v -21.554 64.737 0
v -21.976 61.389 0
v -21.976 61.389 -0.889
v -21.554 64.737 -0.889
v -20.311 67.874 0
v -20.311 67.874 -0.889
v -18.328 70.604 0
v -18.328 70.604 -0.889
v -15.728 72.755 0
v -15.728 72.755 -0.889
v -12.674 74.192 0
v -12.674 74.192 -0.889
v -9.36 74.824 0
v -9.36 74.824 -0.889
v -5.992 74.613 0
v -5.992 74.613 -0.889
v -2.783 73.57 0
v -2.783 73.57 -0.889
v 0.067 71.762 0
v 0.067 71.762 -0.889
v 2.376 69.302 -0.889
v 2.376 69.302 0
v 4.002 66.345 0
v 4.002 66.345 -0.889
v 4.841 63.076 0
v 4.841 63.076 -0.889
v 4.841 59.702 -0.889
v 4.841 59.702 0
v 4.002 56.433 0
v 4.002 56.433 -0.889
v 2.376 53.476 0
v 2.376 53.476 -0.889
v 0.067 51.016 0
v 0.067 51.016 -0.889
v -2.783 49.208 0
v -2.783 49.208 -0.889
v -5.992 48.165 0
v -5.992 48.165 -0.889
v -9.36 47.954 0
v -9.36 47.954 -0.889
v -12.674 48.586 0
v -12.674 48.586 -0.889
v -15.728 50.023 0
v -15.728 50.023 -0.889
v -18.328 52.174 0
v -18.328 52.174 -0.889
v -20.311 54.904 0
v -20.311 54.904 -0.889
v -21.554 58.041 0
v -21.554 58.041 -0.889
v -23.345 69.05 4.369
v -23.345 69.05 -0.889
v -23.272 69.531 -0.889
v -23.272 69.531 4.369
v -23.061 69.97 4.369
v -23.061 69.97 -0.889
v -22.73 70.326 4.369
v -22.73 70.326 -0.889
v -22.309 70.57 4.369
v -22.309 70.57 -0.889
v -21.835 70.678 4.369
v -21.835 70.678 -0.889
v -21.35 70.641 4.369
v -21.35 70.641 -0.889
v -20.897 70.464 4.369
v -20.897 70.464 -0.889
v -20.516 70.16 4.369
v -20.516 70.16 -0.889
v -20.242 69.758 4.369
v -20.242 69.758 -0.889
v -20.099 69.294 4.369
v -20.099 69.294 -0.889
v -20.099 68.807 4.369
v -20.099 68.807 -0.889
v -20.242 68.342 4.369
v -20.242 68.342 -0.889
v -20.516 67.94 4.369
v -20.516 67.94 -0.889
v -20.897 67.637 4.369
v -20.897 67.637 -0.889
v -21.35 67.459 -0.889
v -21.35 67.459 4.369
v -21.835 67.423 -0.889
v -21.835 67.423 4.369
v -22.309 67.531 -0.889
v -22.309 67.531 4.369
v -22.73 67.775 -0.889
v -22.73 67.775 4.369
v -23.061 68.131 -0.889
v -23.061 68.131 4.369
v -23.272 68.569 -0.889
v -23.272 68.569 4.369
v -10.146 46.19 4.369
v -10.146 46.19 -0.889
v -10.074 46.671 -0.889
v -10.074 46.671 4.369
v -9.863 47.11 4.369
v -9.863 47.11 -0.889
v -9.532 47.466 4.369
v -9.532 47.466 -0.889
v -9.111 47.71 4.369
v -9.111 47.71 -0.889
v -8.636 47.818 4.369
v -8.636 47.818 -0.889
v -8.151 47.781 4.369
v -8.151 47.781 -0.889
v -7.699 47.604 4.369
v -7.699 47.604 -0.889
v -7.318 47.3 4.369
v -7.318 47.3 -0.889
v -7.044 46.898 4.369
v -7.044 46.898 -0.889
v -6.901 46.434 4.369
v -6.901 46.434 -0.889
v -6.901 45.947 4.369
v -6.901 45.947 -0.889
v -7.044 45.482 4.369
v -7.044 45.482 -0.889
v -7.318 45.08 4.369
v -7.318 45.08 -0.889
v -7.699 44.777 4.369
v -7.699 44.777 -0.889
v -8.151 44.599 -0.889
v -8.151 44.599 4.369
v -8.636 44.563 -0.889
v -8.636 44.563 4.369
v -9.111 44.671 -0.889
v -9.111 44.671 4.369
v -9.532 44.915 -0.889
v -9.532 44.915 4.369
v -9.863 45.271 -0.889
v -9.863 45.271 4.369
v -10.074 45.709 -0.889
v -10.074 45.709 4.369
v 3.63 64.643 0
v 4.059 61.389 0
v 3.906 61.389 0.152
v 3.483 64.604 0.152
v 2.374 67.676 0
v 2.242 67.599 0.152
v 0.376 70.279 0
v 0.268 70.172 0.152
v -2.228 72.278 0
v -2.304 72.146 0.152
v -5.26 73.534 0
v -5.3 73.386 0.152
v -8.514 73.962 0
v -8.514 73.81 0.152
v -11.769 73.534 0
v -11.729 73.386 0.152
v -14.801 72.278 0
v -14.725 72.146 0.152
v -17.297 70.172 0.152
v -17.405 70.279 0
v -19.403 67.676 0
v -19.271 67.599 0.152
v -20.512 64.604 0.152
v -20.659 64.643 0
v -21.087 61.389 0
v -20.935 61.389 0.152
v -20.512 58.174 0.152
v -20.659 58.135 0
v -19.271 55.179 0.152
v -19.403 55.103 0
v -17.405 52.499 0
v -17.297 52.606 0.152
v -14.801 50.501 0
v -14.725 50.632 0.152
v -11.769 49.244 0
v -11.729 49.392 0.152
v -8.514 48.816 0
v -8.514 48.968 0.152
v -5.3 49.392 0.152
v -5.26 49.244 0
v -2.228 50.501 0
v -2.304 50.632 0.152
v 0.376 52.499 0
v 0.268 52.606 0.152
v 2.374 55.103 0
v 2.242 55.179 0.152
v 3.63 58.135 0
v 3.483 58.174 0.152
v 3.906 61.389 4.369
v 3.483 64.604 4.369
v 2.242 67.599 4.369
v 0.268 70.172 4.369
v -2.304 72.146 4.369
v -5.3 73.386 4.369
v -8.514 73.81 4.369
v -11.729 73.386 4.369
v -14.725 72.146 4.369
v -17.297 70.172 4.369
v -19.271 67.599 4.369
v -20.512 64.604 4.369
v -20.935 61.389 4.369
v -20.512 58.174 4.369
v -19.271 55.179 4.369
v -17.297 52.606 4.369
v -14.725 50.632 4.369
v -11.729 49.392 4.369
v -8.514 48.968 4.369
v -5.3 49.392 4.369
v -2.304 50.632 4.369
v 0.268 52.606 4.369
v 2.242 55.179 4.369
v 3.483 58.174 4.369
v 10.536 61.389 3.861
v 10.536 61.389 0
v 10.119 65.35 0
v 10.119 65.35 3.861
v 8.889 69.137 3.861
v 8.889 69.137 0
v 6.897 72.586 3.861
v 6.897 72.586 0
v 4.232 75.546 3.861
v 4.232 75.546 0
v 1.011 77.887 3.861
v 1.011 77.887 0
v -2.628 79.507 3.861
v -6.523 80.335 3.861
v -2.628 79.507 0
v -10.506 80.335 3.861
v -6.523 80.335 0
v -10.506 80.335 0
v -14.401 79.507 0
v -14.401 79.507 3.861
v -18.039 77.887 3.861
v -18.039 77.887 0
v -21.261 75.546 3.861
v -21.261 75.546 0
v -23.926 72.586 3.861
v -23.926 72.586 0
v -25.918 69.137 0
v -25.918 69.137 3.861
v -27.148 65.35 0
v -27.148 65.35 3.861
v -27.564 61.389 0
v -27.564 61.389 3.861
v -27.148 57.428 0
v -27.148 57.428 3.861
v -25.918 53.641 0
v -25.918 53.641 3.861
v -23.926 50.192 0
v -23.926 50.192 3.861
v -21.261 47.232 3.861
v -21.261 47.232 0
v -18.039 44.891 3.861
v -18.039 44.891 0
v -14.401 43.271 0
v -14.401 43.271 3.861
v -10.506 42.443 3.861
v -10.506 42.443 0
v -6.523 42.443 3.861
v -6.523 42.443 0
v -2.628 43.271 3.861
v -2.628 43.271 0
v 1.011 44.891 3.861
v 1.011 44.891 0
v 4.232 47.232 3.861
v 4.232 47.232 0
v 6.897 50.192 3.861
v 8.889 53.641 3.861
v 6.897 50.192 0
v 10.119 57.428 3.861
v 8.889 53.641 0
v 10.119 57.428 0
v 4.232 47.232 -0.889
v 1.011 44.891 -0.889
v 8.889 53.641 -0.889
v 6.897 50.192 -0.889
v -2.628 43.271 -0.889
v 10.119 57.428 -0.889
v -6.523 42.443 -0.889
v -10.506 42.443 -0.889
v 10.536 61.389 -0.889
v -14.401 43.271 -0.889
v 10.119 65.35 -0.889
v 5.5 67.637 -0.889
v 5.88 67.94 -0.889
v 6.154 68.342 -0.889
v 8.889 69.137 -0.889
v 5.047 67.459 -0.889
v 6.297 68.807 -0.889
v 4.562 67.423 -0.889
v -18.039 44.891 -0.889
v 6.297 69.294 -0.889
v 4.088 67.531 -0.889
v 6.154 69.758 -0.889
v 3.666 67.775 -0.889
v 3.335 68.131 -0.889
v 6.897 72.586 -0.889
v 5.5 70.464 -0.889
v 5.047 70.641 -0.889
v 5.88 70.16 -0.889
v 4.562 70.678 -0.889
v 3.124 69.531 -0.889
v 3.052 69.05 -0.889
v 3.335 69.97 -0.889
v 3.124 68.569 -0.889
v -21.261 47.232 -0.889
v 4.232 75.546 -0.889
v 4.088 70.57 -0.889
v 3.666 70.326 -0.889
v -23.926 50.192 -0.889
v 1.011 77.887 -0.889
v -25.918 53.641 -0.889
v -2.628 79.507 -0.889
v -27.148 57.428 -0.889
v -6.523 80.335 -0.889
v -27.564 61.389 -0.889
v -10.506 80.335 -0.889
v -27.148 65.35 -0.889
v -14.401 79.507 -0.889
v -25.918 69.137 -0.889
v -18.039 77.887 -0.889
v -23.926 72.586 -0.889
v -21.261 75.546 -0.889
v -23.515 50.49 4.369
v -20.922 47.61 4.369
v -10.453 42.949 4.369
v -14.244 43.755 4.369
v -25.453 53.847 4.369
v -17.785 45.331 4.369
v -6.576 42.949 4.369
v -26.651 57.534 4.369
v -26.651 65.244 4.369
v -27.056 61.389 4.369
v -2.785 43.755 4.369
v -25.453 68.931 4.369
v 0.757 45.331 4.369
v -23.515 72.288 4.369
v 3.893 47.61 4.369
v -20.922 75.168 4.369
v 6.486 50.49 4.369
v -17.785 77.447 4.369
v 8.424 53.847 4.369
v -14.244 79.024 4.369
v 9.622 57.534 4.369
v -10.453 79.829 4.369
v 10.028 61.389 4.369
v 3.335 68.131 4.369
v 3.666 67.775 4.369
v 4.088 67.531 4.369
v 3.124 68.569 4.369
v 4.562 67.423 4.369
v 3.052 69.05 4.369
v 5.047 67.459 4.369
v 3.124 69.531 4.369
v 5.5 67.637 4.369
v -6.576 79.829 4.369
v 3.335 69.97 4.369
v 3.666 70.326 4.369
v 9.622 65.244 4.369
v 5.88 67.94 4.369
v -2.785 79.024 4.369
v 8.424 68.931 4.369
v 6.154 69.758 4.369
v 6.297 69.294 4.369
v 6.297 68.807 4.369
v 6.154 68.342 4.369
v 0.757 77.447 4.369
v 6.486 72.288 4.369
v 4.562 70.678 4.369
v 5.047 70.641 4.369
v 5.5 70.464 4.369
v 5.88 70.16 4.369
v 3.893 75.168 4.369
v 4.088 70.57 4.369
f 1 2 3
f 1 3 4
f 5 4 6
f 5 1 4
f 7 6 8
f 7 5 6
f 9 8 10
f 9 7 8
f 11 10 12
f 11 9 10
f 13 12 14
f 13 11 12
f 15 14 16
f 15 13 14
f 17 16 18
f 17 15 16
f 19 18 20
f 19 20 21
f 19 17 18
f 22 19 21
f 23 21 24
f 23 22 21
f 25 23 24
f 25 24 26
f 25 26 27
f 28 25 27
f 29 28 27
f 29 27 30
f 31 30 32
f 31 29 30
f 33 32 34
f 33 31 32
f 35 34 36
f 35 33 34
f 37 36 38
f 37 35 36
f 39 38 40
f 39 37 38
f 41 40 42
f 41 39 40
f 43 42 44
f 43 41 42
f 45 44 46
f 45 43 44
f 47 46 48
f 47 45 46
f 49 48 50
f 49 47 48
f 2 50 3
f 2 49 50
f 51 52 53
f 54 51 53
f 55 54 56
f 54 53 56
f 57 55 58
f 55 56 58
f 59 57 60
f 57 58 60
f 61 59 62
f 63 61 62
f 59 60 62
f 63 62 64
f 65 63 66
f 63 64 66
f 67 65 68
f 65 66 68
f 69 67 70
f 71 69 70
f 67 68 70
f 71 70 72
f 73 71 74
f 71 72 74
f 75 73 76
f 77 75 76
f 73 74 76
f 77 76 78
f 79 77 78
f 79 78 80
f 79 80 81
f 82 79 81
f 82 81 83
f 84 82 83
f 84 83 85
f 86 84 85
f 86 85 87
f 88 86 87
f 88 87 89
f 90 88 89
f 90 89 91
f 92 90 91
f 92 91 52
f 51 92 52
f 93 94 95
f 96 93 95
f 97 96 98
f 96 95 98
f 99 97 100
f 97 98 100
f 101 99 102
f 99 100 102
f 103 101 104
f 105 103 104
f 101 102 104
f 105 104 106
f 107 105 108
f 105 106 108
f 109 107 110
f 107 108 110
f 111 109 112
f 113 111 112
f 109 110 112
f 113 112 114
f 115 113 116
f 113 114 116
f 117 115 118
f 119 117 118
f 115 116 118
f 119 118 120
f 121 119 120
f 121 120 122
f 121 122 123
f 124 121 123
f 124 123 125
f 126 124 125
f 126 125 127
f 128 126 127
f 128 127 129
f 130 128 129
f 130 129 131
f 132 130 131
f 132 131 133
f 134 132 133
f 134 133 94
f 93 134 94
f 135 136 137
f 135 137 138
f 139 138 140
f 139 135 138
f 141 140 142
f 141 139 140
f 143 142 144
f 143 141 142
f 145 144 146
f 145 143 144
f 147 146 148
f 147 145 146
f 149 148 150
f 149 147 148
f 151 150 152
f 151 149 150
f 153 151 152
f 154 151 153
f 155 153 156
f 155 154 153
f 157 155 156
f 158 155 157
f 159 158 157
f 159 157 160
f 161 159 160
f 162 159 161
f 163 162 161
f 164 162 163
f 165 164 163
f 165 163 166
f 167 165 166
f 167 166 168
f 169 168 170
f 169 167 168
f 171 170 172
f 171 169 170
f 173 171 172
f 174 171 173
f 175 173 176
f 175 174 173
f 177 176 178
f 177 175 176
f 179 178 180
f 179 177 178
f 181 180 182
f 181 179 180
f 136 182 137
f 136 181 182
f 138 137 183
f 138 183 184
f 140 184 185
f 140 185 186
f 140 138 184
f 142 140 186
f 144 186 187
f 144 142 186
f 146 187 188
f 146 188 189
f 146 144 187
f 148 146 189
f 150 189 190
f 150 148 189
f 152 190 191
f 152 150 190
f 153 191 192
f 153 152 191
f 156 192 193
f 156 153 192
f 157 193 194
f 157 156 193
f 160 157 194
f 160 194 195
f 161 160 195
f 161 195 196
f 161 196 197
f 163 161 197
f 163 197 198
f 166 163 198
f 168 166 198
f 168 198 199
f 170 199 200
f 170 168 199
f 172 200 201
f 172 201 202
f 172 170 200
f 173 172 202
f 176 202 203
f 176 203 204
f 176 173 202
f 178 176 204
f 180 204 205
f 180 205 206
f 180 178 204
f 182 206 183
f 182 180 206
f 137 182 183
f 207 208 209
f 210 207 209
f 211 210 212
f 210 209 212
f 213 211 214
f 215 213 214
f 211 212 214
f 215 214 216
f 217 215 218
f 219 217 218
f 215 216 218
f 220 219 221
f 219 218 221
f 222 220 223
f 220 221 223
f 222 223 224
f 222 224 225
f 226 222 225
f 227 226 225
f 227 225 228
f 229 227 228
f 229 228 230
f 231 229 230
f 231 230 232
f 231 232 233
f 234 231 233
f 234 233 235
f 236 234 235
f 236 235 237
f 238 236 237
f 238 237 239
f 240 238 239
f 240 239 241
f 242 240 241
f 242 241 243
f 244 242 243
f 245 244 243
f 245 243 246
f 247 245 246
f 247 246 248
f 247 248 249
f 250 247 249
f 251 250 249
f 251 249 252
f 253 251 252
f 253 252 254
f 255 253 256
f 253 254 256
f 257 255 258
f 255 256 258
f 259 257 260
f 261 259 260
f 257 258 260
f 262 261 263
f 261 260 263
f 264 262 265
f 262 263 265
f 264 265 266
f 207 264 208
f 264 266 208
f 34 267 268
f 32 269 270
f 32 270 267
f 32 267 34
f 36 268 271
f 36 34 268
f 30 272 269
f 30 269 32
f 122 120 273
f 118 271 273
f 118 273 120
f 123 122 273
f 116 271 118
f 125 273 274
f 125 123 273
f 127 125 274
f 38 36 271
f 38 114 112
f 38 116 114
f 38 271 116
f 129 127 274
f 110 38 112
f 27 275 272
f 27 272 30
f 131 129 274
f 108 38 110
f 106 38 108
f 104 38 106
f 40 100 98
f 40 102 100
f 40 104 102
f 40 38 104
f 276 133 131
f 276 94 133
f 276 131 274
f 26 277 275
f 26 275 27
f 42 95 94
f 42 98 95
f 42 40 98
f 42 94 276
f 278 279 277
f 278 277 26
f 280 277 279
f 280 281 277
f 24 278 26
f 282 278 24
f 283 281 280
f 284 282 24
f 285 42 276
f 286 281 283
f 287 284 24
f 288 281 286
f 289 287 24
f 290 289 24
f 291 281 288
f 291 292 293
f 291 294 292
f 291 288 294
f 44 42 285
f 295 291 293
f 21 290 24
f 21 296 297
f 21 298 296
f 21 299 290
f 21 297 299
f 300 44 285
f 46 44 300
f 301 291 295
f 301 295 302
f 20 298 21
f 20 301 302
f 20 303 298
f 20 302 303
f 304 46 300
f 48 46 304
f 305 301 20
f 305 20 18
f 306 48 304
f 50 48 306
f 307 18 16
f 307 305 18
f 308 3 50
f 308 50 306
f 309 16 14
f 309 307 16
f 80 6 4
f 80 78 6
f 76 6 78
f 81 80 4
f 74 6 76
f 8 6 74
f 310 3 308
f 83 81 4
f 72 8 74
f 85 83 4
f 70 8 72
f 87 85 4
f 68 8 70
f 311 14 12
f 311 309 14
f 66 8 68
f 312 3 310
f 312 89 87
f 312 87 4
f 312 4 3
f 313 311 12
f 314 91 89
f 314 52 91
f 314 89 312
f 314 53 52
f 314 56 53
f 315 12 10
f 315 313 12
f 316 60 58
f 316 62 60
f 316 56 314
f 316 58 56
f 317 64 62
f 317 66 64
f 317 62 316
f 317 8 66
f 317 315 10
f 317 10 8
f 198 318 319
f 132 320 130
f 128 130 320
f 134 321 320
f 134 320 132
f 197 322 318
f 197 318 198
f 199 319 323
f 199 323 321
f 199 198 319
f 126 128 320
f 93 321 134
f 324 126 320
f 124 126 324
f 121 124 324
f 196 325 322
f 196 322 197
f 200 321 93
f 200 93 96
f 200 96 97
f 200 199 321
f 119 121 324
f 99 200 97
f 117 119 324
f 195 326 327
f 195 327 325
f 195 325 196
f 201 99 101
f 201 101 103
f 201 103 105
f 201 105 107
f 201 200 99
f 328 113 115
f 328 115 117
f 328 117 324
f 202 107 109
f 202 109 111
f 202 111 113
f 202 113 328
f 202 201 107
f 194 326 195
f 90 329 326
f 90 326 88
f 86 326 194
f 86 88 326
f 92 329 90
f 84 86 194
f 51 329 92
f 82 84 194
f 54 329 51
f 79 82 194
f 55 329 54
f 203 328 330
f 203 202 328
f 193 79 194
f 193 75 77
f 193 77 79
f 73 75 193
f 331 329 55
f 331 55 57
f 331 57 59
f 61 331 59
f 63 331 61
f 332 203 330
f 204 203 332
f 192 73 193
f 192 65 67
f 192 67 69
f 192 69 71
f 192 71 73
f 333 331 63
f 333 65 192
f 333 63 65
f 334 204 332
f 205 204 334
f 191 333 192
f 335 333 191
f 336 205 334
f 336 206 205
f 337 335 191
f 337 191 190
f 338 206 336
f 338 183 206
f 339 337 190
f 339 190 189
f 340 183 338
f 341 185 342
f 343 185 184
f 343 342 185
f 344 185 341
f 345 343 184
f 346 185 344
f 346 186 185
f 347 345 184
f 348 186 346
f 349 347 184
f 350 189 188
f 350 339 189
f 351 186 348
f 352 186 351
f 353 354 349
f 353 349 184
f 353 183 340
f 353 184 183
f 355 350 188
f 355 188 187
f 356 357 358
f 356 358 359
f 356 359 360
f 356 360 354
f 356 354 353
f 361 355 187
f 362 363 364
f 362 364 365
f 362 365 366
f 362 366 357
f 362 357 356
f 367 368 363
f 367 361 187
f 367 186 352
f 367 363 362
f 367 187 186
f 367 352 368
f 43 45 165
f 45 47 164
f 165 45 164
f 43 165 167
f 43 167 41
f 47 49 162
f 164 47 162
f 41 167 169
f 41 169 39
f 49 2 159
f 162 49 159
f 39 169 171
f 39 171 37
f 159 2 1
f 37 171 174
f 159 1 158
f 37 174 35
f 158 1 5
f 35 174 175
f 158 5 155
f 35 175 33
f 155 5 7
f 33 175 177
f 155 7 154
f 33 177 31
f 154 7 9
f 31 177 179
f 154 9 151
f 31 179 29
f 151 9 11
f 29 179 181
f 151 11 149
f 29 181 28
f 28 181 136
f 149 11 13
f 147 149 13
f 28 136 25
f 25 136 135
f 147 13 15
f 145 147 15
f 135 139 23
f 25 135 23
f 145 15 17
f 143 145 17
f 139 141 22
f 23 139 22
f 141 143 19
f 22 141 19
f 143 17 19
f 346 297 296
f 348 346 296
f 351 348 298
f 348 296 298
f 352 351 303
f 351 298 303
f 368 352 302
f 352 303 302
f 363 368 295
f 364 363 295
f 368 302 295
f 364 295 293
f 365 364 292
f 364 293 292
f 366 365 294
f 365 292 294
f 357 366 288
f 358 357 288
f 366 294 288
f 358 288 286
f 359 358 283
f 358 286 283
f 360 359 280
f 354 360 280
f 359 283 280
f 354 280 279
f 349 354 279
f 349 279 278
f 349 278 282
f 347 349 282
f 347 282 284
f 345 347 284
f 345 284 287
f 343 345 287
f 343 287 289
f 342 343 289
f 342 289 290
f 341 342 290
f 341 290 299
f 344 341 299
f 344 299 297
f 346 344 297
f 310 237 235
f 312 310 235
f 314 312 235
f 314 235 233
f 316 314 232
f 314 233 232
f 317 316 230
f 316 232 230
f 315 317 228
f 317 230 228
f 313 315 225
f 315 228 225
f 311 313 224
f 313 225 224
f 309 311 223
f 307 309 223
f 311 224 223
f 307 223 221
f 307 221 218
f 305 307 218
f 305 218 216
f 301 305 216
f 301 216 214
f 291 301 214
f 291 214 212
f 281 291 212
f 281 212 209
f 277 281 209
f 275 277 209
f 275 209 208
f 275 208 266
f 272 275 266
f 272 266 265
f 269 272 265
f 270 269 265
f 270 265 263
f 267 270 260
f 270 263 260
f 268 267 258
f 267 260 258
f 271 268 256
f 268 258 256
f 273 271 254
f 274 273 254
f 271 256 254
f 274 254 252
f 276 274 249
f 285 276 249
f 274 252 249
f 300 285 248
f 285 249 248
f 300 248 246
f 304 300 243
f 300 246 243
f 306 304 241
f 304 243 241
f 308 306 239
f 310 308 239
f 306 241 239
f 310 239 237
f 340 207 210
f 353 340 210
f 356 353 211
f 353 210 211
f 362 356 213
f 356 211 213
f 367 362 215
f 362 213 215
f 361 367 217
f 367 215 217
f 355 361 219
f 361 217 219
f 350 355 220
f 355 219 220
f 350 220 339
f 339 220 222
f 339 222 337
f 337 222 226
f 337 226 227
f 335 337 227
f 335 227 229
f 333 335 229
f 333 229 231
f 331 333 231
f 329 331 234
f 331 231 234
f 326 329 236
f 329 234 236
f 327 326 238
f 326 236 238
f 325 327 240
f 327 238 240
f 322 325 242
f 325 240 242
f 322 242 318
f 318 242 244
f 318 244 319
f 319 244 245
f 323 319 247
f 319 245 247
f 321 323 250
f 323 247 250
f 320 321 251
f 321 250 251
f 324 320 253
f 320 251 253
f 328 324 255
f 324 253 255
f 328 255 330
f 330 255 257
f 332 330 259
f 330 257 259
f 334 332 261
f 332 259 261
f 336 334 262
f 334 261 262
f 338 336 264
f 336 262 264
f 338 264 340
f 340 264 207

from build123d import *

# Parameters (mm, degrees)
SKETCH1_R             = 19.05
SKETCH1_R_2           = 12.4206
BOSS_EXTRUDE1_DEPTH   = 4.3688
SKETCH4_R             = 19.05
SKETCH4_R_2           = 13.462
BOSS_EXTRUDE2_DEPTH   = 0.889
F_4_CLEARANCE_HOLE1_D = 3.2639
CHAMFER1_SIZE         = 0.1524
CHAMFER2_SIZE         = 0.508


with BuildPart() as part:
    # Sketch1 → Boss-Extrude1 (new body)
    with BuildSketch(Plane.XY):
        with Locations((-8.514490438, 61.389045102)):
            Circle(SKETCH1_R)
        with Locations((-8.514490438, 61.389045102)):
            Circle(SKETCH1_R_2, mode=Mode.SUBTRACT)
    extrude(amount=BOSS_EXTRUDE1_DEPTH)

    # Sketch4 → Boss-Extrude2 (add)
    with BuildSketch(Plane(origin=(0, 0, 0), x_dir=(-1, 0, 0), z_dir=(0, 0, -1))):
        with Locations((8.514490438, 61.389045102)):
            Circle(SKETCH4_R)
        with Locations((8.514490438, 61.389045102)):
            Circle(SKETCH4_R_2, mode=Mode.SUBTRACT)
    extrude(amount=BOSS_EXTRUDE2_DEPTH)

    # #4 Clearance Hole1 (through all)
    with Locations(Plane(origin=(-12.913159706, 9.247820606, 4.3688), x_dir=(1, 0, 0), z_dir=(0, 0, 1))):
        with Locations((17.596896421, 59.80259772), (-8.799557886, 59.80259772), (4.398669267, 36.94259772)):
            Hole(F_4_CLEARANCE_HOLE1_D / 2)

    # Chamfer1
    chamfer1_edges = [part.edges().sort_by_distance(p)[0] for p in [
        (-20.935090438, 61.389045102, 0),
    ]]
    chamfer(chamfer1_edges, length=CHAMFER1_SIZE)

    # Chamfer2
    chamfer2_edges = [part.edges().sort_by_distance(p)[0] for p in [
        (-27.564490438, 61.389045102, 4.3688),
    ]]
    chamfer(chamfer2_edges, length=CHAMFER2_SIZE)


solid = part.part
